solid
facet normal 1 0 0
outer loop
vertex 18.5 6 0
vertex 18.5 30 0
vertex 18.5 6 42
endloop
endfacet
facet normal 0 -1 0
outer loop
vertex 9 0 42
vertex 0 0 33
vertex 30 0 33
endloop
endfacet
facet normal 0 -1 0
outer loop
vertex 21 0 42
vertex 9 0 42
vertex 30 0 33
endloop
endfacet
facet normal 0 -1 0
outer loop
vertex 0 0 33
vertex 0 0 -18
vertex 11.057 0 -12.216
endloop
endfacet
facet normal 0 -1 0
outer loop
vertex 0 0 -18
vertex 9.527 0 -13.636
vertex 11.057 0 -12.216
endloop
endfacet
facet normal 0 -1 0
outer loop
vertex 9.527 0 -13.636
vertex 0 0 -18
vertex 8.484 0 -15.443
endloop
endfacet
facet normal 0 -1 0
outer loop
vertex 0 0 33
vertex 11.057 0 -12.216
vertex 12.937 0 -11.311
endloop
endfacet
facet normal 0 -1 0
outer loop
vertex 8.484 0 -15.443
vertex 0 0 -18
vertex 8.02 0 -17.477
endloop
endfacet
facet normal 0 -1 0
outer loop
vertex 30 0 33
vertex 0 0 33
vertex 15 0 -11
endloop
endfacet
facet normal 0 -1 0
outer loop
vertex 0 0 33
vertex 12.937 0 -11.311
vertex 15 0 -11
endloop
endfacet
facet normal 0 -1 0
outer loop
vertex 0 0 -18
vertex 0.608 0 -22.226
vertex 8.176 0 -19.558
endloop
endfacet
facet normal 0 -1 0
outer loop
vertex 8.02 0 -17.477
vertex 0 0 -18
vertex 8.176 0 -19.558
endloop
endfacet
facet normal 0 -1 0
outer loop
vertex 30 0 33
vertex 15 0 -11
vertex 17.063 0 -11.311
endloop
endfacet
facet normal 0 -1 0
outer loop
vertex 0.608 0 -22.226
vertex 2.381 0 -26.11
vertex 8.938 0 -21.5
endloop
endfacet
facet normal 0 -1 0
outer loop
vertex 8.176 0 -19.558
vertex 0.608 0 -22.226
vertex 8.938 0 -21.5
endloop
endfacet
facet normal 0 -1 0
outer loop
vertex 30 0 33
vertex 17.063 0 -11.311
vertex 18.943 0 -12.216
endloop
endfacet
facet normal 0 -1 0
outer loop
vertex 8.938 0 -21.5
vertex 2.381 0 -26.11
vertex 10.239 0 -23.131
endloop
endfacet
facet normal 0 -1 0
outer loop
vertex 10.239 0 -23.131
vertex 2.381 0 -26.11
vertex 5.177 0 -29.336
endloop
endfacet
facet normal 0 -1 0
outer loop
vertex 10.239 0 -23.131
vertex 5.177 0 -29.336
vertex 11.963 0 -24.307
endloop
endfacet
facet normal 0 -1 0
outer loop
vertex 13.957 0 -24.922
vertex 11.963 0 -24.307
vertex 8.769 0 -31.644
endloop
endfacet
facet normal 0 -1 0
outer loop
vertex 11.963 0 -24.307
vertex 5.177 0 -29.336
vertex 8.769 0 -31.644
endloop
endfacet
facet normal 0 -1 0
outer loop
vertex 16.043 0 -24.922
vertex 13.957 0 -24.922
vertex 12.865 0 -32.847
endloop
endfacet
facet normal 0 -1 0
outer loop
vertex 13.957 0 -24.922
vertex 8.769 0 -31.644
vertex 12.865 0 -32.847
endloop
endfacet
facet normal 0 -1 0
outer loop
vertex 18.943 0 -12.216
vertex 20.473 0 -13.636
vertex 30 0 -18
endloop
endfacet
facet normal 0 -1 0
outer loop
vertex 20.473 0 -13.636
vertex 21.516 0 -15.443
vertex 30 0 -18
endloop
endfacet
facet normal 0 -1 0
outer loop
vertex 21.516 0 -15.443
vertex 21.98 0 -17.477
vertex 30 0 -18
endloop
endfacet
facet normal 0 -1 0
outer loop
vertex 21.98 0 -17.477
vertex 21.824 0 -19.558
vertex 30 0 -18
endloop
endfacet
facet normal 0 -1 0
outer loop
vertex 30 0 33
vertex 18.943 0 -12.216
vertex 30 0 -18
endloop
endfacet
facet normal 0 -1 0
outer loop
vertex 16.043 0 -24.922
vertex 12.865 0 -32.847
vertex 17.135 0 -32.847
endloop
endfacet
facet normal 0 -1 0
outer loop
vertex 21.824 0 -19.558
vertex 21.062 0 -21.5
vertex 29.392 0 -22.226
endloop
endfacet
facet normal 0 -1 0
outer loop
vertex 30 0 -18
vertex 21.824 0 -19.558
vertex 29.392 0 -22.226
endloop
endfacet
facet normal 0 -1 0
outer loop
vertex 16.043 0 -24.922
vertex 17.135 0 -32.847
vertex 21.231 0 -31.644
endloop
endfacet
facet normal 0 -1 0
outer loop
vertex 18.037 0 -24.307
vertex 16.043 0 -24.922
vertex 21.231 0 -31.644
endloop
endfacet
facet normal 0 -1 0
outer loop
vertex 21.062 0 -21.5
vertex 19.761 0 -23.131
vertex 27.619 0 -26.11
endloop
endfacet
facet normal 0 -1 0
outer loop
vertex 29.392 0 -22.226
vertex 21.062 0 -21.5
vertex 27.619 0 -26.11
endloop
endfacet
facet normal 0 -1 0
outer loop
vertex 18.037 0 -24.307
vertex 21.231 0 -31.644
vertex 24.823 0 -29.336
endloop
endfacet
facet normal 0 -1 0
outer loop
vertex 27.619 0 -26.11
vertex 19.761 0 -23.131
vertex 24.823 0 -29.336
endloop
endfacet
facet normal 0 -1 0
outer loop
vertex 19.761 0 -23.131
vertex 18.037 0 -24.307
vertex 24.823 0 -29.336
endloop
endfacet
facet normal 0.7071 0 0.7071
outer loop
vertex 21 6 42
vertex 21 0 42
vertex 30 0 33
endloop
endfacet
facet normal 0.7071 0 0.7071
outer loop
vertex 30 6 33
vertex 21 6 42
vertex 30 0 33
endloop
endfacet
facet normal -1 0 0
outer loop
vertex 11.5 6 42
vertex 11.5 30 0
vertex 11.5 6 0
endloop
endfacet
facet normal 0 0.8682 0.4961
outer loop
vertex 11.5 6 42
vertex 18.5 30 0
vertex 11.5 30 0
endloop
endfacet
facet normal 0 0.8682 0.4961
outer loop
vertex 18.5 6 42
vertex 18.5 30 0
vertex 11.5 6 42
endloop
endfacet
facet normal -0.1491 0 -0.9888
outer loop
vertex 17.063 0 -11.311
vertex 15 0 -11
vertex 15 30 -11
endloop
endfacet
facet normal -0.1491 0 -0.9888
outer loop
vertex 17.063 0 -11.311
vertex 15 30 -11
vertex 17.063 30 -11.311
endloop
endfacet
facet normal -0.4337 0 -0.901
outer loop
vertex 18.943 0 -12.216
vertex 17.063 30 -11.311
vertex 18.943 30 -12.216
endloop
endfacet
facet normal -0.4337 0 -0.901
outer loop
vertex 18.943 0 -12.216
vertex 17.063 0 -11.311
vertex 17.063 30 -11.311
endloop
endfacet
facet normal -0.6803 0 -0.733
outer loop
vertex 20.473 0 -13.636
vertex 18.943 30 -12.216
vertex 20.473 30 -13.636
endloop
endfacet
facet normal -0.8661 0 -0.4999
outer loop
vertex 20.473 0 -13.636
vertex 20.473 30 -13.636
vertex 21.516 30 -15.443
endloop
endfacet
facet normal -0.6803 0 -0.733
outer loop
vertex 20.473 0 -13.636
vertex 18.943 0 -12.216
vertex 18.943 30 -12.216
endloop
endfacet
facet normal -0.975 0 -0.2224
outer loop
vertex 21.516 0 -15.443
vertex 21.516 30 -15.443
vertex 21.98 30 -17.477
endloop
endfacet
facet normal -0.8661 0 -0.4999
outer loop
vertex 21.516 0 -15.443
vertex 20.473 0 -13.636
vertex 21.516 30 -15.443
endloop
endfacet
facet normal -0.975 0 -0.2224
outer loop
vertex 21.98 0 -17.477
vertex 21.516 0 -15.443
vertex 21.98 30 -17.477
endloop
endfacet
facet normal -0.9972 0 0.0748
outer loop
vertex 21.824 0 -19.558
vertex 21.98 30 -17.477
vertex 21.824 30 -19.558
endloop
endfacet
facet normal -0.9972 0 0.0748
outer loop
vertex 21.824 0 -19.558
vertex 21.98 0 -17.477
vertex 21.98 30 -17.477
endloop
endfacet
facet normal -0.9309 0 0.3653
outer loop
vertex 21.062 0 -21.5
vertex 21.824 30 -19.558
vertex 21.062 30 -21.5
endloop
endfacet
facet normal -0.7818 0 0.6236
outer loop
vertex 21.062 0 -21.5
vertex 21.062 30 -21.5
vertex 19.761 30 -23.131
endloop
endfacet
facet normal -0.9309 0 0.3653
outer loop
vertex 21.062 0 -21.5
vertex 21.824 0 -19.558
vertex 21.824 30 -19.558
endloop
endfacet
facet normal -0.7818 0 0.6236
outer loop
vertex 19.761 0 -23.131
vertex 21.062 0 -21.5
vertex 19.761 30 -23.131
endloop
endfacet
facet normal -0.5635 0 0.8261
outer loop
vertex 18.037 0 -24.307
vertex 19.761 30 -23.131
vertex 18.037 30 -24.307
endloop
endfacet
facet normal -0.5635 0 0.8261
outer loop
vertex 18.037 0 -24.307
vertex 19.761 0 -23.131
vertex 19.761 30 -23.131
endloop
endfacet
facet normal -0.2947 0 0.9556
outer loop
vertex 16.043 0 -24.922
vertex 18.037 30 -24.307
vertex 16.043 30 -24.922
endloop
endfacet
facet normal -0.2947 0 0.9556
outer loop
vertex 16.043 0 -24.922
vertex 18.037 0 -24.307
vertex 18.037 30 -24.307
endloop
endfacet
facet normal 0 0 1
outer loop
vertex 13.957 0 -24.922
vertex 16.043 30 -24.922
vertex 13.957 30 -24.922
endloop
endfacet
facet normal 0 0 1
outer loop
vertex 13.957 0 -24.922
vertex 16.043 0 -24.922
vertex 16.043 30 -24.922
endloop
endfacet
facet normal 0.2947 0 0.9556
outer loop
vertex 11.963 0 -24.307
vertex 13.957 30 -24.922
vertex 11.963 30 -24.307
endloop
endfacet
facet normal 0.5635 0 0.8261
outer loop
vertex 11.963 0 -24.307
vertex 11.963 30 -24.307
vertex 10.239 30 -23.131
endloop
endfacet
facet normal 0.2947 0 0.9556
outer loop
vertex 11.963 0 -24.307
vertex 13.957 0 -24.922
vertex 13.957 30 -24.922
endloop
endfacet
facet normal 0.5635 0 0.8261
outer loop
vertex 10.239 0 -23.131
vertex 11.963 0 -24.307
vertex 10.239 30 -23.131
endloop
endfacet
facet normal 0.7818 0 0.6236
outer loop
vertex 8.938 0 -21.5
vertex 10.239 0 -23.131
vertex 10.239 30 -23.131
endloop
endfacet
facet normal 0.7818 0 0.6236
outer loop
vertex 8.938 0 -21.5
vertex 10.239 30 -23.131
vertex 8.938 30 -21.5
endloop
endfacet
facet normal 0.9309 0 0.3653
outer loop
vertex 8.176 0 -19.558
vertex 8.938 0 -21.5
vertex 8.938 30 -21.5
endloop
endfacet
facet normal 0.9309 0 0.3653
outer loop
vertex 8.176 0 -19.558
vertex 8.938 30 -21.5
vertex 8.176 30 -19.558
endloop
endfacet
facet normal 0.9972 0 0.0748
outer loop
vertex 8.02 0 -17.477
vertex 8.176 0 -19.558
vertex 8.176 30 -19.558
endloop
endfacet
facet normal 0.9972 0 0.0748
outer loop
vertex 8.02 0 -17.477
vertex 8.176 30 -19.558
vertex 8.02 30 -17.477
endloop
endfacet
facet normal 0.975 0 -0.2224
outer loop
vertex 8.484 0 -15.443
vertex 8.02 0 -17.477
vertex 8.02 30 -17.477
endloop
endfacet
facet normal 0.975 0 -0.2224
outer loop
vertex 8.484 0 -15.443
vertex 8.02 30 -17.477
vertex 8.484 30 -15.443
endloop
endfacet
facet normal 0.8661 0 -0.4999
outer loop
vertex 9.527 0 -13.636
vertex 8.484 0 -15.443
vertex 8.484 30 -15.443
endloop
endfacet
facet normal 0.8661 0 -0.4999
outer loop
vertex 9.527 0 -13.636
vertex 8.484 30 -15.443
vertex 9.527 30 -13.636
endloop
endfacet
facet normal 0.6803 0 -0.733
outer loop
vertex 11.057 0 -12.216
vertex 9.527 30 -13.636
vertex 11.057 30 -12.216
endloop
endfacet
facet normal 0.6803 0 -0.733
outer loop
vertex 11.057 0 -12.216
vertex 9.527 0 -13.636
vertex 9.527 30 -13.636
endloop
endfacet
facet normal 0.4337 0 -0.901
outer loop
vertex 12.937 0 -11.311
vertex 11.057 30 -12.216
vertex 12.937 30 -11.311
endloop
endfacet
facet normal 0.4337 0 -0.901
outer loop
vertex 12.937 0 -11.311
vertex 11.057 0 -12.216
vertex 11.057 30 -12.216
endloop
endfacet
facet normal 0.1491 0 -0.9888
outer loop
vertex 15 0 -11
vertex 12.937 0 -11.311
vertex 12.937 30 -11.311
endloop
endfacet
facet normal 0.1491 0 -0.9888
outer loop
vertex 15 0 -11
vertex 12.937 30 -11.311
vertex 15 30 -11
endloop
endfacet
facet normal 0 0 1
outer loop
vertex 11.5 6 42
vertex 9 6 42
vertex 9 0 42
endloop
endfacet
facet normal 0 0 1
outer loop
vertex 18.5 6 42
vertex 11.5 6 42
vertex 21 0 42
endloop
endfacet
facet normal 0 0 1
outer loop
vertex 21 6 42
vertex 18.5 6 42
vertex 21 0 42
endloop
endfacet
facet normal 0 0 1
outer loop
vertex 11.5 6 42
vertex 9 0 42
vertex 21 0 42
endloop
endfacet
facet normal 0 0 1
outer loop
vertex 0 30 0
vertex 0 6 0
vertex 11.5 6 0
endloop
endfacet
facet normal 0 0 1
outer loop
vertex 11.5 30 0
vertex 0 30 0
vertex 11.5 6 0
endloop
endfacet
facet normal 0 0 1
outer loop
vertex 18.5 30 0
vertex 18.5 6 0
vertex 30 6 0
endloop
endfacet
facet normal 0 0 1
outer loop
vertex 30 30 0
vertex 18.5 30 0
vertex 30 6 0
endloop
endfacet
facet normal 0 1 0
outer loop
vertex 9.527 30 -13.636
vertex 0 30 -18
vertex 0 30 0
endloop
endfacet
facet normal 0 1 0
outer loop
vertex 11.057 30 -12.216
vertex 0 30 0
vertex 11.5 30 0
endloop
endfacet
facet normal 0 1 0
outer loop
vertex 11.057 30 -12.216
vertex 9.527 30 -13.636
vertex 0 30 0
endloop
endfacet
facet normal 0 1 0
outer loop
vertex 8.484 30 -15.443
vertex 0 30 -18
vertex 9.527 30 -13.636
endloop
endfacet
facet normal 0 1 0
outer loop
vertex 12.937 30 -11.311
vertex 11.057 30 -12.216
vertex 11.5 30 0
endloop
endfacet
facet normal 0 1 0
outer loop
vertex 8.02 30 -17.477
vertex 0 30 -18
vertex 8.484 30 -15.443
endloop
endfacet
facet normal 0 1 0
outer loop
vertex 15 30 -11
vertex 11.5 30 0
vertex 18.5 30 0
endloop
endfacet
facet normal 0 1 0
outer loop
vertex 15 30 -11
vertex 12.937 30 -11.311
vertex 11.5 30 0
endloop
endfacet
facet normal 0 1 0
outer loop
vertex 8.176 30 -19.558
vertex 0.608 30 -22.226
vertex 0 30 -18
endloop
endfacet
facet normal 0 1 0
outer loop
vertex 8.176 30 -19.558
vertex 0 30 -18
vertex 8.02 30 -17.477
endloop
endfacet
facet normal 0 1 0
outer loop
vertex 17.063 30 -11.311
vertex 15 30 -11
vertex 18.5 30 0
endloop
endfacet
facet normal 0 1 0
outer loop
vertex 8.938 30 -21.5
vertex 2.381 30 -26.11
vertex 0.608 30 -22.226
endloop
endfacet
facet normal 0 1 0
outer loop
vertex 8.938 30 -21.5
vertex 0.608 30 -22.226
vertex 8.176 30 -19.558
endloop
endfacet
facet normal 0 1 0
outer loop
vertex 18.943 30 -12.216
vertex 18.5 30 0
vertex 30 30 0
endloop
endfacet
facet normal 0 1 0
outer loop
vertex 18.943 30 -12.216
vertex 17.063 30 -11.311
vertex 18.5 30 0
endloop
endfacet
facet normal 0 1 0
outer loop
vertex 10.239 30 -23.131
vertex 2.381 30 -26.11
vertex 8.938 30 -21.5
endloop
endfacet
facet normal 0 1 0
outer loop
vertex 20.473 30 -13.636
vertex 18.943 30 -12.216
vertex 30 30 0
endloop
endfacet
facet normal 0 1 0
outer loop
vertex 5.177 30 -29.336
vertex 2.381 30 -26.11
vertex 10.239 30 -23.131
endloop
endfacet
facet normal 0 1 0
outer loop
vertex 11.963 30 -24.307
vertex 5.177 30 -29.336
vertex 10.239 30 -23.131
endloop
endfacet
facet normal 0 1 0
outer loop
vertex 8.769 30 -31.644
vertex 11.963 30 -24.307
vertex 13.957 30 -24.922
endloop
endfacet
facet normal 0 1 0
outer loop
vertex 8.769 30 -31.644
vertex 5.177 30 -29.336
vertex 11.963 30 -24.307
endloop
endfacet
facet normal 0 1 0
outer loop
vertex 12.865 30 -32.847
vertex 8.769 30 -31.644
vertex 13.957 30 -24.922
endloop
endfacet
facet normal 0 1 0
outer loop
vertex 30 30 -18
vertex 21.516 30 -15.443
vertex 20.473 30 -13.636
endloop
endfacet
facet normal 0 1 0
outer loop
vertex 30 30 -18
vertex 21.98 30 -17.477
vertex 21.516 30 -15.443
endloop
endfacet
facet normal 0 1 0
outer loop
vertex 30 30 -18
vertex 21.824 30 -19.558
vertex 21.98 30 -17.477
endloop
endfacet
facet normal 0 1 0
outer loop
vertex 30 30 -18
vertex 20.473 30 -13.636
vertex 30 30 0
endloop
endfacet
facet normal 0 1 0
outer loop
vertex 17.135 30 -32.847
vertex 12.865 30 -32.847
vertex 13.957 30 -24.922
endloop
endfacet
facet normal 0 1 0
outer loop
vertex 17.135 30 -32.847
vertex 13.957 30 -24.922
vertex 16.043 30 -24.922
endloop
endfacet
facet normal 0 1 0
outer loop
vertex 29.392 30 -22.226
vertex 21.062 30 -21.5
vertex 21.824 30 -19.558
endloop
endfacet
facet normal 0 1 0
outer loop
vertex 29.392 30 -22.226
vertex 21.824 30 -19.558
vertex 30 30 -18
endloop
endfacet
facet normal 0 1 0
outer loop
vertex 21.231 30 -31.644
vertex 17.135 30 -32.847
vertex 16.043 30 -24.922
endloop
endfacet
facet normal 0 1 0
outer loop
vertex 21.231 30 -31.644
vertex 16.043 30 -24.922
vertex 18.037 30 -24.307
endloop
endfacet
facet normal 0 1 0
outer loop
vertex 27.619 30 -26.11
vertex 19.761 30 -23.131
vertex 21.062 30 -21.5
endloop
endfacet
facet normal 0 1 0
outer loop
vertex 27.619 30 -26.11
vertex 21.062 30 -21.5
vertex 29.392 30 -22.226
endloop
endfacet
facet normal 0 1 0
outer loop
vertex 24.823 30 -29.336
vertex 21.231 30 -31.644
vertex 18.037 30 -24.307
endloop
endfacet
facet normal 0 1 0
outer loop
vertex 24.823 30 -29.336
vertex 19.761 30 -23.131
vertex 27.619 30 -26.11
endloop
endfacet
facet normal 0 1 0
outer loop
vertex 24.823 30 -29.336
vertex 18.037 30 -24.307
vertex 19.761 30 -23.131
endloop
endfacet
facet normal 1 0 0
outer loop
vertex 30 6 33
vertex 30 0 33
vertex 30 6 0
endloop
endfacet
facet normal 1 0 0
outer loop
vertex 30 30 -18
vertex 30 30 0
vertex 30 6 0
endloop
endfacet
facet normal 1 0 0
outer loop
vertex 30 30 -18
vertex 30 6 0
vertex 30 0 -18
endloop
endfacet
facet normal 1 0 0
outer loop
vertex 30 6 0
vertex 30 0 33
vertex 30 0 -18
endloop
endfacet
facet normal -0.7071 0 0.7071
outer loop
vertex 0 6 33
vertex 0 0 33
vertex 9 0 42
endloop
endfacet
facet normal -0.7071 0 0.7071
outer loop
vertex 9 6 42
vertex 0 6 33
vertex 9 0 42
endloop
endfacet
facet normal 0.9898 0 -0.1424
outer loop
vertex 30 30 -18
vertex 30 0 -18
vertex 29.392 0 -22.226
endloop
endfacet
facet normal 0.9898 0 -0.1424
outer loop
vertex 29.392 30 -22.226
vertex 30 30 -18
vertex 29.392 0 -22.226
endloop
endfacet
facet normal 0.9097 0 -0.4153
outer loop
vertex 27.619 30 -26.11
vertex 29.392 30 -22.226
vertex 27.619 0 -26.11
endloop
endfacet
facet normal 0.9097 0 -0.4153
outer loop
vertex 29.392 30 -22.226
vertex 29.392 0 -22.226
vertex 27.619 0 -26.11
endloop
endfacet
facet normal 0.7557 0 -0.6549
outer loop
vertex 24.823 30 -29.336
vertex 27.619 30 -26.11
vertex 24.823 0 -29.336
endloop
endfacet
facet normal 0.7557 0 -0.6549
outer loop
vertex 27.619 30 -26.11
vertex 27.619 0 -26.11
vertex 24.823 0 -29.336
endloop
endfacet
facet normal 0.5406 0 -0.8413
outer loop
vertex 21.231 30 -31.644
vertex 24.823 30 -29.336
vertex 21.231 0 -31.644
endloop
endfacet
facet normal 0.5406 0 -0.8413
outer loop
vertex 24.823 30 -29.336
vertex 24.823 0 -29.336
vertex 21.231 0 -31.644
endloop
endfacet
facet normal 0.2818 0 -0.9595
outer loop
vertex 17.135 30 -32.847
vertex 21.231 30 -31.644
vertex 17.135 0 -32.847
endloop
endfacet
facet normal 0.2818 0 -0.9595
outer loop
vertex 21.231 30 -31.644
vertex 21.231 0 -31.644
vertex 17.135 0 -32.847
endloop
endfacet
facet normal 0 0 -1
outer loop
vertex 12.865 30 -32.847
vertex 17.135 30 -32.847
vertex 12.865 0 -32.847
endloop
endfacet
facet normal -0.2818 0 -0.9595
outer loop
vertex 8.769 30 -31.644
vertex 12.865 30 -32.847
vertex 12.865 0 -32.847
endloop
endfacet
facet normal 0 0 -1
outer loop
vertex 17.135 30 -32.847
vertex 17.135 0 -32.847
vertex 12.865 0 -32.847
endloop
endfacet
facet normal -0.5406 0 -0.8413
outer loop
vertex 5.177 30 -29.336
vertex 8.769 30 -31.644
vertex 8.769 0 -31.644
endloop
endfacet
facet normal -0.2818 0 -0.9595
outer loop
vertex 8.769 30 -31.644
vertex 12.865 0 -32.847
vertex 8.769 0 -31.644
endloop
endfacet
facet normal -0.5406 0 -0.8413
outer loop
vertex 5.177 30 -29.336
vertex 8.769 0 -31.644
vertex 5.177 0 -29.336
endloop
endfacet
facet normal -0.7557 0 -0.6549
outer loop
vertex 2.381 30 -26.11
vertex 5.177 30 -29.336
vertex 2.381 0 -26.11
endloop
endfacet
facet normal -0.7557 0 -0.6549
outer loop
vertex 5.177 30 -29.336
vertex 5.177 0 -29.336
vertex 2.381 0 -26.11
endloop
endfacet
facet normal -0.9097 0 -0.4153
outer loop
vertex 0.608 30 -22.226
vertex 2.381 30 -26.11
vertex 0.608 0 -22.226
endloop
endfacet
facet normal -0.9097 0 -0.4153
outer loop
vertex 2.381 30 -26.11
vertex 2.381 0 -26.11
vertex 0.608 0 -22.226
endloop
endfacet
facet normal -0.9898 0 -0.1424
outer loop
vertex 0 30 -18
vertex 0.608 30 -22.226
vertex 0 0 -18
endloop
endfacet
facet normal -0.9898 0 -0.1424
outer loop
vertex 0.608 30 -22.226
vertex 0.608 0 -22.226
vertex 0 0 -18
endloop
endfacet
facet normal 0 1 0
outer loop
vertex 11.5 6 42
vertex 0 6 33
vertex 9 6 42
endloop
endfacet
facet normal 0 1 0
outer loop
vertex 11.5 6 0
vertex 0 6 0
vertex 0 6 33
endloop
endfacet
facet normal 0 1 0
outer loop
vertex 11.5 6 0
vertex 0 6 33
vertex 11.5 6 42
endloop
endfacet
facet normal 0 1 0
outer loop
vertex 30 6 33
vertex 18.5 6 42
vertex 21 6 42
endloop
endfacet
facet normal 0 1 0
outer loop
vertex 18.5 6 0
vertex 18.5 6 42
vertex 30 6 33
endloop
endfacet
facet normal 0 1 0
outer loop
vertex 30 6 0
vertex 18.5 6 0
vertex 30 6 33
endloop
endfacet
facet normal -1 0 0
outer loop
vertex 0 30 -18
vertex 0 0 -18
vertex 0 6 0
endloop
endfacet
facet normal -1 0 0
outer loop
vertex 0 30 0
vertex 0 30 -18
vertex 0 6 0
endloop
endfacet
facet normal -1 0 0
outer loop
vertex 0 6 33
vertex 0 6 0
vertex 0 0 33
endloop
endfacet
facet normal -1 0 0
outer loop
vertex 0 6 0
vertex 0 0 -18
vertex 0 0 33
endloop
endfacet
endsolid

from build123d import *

# Parameters (mm, degrees)
SKETCH1_R           = 7
BOSS_EXTRUDE2_DEPTH = 30
BOSS_EXTRUDE4_DEPTH = 6
RIB3_REACH          = 55.749
SKETCH5_WALL_W      = 157.872383692
SKETCH5_WALL_H      = 7


with BuildPart() as part:
    # Sketch1 → Boss-Extrude2 (new body)
    with BuildSketch(Plane(origin=(0, 0, 0), x_dir=(1, 0, 0), z_dir=(0, 1, 0))):
        with BuildLine():
            Line((0, 0), (30, 0))
            Line((30, 0), (30, 18))
            ThreePointArc((30, 18), (15, 33), (0, 18))
            Line((0, 18), (0, 0))
        make_face()
        with Locations(Location((15, 18, 0), (0, 0, 270))):
            Circle(SKETCH1_R, mode=Mode.SUBTRACT)
    extrude(amount=BOSS_EXTRUDE2_DEPTH)

    # Sketch3 → Boss-Extrude4 (add)
    with BuildSketch(Plane(origin=(0, 0, 0), x_dir=(-1, 0, 0), z_dir=(0, -1, 0))):
        Polygon((-21, -42), (-30, -33), (-30, 0), (0, 0), (0, -33), (-9, -42), align=None)
    extrude(amount=-BOSS_EXTRUDE4_DEPTH)

    # Sketch5 wall → Rib3 (add, up to next)
    with BuildSketch(Plane(origin=(15, 18, 21), x_dir=(0, -0.496138938357, 0.868243142124), z_dir=(0, 0.868243142124, 0.496138938357)), mode=Mode.PRIVATE) as rib3_sk1:
        Rectangle(SKETCH5_WALL_W, SKETCH5_WALL_H)
    rib3_tool1 = extrude(rib3_sk1.sketch, amount=-RIB3_REACH, mode=Mode.PRIVATE) - part.part
    add(rib3_tool1.solids().sort_by_distance((15, 18, 21))[0])


solid = part.part
